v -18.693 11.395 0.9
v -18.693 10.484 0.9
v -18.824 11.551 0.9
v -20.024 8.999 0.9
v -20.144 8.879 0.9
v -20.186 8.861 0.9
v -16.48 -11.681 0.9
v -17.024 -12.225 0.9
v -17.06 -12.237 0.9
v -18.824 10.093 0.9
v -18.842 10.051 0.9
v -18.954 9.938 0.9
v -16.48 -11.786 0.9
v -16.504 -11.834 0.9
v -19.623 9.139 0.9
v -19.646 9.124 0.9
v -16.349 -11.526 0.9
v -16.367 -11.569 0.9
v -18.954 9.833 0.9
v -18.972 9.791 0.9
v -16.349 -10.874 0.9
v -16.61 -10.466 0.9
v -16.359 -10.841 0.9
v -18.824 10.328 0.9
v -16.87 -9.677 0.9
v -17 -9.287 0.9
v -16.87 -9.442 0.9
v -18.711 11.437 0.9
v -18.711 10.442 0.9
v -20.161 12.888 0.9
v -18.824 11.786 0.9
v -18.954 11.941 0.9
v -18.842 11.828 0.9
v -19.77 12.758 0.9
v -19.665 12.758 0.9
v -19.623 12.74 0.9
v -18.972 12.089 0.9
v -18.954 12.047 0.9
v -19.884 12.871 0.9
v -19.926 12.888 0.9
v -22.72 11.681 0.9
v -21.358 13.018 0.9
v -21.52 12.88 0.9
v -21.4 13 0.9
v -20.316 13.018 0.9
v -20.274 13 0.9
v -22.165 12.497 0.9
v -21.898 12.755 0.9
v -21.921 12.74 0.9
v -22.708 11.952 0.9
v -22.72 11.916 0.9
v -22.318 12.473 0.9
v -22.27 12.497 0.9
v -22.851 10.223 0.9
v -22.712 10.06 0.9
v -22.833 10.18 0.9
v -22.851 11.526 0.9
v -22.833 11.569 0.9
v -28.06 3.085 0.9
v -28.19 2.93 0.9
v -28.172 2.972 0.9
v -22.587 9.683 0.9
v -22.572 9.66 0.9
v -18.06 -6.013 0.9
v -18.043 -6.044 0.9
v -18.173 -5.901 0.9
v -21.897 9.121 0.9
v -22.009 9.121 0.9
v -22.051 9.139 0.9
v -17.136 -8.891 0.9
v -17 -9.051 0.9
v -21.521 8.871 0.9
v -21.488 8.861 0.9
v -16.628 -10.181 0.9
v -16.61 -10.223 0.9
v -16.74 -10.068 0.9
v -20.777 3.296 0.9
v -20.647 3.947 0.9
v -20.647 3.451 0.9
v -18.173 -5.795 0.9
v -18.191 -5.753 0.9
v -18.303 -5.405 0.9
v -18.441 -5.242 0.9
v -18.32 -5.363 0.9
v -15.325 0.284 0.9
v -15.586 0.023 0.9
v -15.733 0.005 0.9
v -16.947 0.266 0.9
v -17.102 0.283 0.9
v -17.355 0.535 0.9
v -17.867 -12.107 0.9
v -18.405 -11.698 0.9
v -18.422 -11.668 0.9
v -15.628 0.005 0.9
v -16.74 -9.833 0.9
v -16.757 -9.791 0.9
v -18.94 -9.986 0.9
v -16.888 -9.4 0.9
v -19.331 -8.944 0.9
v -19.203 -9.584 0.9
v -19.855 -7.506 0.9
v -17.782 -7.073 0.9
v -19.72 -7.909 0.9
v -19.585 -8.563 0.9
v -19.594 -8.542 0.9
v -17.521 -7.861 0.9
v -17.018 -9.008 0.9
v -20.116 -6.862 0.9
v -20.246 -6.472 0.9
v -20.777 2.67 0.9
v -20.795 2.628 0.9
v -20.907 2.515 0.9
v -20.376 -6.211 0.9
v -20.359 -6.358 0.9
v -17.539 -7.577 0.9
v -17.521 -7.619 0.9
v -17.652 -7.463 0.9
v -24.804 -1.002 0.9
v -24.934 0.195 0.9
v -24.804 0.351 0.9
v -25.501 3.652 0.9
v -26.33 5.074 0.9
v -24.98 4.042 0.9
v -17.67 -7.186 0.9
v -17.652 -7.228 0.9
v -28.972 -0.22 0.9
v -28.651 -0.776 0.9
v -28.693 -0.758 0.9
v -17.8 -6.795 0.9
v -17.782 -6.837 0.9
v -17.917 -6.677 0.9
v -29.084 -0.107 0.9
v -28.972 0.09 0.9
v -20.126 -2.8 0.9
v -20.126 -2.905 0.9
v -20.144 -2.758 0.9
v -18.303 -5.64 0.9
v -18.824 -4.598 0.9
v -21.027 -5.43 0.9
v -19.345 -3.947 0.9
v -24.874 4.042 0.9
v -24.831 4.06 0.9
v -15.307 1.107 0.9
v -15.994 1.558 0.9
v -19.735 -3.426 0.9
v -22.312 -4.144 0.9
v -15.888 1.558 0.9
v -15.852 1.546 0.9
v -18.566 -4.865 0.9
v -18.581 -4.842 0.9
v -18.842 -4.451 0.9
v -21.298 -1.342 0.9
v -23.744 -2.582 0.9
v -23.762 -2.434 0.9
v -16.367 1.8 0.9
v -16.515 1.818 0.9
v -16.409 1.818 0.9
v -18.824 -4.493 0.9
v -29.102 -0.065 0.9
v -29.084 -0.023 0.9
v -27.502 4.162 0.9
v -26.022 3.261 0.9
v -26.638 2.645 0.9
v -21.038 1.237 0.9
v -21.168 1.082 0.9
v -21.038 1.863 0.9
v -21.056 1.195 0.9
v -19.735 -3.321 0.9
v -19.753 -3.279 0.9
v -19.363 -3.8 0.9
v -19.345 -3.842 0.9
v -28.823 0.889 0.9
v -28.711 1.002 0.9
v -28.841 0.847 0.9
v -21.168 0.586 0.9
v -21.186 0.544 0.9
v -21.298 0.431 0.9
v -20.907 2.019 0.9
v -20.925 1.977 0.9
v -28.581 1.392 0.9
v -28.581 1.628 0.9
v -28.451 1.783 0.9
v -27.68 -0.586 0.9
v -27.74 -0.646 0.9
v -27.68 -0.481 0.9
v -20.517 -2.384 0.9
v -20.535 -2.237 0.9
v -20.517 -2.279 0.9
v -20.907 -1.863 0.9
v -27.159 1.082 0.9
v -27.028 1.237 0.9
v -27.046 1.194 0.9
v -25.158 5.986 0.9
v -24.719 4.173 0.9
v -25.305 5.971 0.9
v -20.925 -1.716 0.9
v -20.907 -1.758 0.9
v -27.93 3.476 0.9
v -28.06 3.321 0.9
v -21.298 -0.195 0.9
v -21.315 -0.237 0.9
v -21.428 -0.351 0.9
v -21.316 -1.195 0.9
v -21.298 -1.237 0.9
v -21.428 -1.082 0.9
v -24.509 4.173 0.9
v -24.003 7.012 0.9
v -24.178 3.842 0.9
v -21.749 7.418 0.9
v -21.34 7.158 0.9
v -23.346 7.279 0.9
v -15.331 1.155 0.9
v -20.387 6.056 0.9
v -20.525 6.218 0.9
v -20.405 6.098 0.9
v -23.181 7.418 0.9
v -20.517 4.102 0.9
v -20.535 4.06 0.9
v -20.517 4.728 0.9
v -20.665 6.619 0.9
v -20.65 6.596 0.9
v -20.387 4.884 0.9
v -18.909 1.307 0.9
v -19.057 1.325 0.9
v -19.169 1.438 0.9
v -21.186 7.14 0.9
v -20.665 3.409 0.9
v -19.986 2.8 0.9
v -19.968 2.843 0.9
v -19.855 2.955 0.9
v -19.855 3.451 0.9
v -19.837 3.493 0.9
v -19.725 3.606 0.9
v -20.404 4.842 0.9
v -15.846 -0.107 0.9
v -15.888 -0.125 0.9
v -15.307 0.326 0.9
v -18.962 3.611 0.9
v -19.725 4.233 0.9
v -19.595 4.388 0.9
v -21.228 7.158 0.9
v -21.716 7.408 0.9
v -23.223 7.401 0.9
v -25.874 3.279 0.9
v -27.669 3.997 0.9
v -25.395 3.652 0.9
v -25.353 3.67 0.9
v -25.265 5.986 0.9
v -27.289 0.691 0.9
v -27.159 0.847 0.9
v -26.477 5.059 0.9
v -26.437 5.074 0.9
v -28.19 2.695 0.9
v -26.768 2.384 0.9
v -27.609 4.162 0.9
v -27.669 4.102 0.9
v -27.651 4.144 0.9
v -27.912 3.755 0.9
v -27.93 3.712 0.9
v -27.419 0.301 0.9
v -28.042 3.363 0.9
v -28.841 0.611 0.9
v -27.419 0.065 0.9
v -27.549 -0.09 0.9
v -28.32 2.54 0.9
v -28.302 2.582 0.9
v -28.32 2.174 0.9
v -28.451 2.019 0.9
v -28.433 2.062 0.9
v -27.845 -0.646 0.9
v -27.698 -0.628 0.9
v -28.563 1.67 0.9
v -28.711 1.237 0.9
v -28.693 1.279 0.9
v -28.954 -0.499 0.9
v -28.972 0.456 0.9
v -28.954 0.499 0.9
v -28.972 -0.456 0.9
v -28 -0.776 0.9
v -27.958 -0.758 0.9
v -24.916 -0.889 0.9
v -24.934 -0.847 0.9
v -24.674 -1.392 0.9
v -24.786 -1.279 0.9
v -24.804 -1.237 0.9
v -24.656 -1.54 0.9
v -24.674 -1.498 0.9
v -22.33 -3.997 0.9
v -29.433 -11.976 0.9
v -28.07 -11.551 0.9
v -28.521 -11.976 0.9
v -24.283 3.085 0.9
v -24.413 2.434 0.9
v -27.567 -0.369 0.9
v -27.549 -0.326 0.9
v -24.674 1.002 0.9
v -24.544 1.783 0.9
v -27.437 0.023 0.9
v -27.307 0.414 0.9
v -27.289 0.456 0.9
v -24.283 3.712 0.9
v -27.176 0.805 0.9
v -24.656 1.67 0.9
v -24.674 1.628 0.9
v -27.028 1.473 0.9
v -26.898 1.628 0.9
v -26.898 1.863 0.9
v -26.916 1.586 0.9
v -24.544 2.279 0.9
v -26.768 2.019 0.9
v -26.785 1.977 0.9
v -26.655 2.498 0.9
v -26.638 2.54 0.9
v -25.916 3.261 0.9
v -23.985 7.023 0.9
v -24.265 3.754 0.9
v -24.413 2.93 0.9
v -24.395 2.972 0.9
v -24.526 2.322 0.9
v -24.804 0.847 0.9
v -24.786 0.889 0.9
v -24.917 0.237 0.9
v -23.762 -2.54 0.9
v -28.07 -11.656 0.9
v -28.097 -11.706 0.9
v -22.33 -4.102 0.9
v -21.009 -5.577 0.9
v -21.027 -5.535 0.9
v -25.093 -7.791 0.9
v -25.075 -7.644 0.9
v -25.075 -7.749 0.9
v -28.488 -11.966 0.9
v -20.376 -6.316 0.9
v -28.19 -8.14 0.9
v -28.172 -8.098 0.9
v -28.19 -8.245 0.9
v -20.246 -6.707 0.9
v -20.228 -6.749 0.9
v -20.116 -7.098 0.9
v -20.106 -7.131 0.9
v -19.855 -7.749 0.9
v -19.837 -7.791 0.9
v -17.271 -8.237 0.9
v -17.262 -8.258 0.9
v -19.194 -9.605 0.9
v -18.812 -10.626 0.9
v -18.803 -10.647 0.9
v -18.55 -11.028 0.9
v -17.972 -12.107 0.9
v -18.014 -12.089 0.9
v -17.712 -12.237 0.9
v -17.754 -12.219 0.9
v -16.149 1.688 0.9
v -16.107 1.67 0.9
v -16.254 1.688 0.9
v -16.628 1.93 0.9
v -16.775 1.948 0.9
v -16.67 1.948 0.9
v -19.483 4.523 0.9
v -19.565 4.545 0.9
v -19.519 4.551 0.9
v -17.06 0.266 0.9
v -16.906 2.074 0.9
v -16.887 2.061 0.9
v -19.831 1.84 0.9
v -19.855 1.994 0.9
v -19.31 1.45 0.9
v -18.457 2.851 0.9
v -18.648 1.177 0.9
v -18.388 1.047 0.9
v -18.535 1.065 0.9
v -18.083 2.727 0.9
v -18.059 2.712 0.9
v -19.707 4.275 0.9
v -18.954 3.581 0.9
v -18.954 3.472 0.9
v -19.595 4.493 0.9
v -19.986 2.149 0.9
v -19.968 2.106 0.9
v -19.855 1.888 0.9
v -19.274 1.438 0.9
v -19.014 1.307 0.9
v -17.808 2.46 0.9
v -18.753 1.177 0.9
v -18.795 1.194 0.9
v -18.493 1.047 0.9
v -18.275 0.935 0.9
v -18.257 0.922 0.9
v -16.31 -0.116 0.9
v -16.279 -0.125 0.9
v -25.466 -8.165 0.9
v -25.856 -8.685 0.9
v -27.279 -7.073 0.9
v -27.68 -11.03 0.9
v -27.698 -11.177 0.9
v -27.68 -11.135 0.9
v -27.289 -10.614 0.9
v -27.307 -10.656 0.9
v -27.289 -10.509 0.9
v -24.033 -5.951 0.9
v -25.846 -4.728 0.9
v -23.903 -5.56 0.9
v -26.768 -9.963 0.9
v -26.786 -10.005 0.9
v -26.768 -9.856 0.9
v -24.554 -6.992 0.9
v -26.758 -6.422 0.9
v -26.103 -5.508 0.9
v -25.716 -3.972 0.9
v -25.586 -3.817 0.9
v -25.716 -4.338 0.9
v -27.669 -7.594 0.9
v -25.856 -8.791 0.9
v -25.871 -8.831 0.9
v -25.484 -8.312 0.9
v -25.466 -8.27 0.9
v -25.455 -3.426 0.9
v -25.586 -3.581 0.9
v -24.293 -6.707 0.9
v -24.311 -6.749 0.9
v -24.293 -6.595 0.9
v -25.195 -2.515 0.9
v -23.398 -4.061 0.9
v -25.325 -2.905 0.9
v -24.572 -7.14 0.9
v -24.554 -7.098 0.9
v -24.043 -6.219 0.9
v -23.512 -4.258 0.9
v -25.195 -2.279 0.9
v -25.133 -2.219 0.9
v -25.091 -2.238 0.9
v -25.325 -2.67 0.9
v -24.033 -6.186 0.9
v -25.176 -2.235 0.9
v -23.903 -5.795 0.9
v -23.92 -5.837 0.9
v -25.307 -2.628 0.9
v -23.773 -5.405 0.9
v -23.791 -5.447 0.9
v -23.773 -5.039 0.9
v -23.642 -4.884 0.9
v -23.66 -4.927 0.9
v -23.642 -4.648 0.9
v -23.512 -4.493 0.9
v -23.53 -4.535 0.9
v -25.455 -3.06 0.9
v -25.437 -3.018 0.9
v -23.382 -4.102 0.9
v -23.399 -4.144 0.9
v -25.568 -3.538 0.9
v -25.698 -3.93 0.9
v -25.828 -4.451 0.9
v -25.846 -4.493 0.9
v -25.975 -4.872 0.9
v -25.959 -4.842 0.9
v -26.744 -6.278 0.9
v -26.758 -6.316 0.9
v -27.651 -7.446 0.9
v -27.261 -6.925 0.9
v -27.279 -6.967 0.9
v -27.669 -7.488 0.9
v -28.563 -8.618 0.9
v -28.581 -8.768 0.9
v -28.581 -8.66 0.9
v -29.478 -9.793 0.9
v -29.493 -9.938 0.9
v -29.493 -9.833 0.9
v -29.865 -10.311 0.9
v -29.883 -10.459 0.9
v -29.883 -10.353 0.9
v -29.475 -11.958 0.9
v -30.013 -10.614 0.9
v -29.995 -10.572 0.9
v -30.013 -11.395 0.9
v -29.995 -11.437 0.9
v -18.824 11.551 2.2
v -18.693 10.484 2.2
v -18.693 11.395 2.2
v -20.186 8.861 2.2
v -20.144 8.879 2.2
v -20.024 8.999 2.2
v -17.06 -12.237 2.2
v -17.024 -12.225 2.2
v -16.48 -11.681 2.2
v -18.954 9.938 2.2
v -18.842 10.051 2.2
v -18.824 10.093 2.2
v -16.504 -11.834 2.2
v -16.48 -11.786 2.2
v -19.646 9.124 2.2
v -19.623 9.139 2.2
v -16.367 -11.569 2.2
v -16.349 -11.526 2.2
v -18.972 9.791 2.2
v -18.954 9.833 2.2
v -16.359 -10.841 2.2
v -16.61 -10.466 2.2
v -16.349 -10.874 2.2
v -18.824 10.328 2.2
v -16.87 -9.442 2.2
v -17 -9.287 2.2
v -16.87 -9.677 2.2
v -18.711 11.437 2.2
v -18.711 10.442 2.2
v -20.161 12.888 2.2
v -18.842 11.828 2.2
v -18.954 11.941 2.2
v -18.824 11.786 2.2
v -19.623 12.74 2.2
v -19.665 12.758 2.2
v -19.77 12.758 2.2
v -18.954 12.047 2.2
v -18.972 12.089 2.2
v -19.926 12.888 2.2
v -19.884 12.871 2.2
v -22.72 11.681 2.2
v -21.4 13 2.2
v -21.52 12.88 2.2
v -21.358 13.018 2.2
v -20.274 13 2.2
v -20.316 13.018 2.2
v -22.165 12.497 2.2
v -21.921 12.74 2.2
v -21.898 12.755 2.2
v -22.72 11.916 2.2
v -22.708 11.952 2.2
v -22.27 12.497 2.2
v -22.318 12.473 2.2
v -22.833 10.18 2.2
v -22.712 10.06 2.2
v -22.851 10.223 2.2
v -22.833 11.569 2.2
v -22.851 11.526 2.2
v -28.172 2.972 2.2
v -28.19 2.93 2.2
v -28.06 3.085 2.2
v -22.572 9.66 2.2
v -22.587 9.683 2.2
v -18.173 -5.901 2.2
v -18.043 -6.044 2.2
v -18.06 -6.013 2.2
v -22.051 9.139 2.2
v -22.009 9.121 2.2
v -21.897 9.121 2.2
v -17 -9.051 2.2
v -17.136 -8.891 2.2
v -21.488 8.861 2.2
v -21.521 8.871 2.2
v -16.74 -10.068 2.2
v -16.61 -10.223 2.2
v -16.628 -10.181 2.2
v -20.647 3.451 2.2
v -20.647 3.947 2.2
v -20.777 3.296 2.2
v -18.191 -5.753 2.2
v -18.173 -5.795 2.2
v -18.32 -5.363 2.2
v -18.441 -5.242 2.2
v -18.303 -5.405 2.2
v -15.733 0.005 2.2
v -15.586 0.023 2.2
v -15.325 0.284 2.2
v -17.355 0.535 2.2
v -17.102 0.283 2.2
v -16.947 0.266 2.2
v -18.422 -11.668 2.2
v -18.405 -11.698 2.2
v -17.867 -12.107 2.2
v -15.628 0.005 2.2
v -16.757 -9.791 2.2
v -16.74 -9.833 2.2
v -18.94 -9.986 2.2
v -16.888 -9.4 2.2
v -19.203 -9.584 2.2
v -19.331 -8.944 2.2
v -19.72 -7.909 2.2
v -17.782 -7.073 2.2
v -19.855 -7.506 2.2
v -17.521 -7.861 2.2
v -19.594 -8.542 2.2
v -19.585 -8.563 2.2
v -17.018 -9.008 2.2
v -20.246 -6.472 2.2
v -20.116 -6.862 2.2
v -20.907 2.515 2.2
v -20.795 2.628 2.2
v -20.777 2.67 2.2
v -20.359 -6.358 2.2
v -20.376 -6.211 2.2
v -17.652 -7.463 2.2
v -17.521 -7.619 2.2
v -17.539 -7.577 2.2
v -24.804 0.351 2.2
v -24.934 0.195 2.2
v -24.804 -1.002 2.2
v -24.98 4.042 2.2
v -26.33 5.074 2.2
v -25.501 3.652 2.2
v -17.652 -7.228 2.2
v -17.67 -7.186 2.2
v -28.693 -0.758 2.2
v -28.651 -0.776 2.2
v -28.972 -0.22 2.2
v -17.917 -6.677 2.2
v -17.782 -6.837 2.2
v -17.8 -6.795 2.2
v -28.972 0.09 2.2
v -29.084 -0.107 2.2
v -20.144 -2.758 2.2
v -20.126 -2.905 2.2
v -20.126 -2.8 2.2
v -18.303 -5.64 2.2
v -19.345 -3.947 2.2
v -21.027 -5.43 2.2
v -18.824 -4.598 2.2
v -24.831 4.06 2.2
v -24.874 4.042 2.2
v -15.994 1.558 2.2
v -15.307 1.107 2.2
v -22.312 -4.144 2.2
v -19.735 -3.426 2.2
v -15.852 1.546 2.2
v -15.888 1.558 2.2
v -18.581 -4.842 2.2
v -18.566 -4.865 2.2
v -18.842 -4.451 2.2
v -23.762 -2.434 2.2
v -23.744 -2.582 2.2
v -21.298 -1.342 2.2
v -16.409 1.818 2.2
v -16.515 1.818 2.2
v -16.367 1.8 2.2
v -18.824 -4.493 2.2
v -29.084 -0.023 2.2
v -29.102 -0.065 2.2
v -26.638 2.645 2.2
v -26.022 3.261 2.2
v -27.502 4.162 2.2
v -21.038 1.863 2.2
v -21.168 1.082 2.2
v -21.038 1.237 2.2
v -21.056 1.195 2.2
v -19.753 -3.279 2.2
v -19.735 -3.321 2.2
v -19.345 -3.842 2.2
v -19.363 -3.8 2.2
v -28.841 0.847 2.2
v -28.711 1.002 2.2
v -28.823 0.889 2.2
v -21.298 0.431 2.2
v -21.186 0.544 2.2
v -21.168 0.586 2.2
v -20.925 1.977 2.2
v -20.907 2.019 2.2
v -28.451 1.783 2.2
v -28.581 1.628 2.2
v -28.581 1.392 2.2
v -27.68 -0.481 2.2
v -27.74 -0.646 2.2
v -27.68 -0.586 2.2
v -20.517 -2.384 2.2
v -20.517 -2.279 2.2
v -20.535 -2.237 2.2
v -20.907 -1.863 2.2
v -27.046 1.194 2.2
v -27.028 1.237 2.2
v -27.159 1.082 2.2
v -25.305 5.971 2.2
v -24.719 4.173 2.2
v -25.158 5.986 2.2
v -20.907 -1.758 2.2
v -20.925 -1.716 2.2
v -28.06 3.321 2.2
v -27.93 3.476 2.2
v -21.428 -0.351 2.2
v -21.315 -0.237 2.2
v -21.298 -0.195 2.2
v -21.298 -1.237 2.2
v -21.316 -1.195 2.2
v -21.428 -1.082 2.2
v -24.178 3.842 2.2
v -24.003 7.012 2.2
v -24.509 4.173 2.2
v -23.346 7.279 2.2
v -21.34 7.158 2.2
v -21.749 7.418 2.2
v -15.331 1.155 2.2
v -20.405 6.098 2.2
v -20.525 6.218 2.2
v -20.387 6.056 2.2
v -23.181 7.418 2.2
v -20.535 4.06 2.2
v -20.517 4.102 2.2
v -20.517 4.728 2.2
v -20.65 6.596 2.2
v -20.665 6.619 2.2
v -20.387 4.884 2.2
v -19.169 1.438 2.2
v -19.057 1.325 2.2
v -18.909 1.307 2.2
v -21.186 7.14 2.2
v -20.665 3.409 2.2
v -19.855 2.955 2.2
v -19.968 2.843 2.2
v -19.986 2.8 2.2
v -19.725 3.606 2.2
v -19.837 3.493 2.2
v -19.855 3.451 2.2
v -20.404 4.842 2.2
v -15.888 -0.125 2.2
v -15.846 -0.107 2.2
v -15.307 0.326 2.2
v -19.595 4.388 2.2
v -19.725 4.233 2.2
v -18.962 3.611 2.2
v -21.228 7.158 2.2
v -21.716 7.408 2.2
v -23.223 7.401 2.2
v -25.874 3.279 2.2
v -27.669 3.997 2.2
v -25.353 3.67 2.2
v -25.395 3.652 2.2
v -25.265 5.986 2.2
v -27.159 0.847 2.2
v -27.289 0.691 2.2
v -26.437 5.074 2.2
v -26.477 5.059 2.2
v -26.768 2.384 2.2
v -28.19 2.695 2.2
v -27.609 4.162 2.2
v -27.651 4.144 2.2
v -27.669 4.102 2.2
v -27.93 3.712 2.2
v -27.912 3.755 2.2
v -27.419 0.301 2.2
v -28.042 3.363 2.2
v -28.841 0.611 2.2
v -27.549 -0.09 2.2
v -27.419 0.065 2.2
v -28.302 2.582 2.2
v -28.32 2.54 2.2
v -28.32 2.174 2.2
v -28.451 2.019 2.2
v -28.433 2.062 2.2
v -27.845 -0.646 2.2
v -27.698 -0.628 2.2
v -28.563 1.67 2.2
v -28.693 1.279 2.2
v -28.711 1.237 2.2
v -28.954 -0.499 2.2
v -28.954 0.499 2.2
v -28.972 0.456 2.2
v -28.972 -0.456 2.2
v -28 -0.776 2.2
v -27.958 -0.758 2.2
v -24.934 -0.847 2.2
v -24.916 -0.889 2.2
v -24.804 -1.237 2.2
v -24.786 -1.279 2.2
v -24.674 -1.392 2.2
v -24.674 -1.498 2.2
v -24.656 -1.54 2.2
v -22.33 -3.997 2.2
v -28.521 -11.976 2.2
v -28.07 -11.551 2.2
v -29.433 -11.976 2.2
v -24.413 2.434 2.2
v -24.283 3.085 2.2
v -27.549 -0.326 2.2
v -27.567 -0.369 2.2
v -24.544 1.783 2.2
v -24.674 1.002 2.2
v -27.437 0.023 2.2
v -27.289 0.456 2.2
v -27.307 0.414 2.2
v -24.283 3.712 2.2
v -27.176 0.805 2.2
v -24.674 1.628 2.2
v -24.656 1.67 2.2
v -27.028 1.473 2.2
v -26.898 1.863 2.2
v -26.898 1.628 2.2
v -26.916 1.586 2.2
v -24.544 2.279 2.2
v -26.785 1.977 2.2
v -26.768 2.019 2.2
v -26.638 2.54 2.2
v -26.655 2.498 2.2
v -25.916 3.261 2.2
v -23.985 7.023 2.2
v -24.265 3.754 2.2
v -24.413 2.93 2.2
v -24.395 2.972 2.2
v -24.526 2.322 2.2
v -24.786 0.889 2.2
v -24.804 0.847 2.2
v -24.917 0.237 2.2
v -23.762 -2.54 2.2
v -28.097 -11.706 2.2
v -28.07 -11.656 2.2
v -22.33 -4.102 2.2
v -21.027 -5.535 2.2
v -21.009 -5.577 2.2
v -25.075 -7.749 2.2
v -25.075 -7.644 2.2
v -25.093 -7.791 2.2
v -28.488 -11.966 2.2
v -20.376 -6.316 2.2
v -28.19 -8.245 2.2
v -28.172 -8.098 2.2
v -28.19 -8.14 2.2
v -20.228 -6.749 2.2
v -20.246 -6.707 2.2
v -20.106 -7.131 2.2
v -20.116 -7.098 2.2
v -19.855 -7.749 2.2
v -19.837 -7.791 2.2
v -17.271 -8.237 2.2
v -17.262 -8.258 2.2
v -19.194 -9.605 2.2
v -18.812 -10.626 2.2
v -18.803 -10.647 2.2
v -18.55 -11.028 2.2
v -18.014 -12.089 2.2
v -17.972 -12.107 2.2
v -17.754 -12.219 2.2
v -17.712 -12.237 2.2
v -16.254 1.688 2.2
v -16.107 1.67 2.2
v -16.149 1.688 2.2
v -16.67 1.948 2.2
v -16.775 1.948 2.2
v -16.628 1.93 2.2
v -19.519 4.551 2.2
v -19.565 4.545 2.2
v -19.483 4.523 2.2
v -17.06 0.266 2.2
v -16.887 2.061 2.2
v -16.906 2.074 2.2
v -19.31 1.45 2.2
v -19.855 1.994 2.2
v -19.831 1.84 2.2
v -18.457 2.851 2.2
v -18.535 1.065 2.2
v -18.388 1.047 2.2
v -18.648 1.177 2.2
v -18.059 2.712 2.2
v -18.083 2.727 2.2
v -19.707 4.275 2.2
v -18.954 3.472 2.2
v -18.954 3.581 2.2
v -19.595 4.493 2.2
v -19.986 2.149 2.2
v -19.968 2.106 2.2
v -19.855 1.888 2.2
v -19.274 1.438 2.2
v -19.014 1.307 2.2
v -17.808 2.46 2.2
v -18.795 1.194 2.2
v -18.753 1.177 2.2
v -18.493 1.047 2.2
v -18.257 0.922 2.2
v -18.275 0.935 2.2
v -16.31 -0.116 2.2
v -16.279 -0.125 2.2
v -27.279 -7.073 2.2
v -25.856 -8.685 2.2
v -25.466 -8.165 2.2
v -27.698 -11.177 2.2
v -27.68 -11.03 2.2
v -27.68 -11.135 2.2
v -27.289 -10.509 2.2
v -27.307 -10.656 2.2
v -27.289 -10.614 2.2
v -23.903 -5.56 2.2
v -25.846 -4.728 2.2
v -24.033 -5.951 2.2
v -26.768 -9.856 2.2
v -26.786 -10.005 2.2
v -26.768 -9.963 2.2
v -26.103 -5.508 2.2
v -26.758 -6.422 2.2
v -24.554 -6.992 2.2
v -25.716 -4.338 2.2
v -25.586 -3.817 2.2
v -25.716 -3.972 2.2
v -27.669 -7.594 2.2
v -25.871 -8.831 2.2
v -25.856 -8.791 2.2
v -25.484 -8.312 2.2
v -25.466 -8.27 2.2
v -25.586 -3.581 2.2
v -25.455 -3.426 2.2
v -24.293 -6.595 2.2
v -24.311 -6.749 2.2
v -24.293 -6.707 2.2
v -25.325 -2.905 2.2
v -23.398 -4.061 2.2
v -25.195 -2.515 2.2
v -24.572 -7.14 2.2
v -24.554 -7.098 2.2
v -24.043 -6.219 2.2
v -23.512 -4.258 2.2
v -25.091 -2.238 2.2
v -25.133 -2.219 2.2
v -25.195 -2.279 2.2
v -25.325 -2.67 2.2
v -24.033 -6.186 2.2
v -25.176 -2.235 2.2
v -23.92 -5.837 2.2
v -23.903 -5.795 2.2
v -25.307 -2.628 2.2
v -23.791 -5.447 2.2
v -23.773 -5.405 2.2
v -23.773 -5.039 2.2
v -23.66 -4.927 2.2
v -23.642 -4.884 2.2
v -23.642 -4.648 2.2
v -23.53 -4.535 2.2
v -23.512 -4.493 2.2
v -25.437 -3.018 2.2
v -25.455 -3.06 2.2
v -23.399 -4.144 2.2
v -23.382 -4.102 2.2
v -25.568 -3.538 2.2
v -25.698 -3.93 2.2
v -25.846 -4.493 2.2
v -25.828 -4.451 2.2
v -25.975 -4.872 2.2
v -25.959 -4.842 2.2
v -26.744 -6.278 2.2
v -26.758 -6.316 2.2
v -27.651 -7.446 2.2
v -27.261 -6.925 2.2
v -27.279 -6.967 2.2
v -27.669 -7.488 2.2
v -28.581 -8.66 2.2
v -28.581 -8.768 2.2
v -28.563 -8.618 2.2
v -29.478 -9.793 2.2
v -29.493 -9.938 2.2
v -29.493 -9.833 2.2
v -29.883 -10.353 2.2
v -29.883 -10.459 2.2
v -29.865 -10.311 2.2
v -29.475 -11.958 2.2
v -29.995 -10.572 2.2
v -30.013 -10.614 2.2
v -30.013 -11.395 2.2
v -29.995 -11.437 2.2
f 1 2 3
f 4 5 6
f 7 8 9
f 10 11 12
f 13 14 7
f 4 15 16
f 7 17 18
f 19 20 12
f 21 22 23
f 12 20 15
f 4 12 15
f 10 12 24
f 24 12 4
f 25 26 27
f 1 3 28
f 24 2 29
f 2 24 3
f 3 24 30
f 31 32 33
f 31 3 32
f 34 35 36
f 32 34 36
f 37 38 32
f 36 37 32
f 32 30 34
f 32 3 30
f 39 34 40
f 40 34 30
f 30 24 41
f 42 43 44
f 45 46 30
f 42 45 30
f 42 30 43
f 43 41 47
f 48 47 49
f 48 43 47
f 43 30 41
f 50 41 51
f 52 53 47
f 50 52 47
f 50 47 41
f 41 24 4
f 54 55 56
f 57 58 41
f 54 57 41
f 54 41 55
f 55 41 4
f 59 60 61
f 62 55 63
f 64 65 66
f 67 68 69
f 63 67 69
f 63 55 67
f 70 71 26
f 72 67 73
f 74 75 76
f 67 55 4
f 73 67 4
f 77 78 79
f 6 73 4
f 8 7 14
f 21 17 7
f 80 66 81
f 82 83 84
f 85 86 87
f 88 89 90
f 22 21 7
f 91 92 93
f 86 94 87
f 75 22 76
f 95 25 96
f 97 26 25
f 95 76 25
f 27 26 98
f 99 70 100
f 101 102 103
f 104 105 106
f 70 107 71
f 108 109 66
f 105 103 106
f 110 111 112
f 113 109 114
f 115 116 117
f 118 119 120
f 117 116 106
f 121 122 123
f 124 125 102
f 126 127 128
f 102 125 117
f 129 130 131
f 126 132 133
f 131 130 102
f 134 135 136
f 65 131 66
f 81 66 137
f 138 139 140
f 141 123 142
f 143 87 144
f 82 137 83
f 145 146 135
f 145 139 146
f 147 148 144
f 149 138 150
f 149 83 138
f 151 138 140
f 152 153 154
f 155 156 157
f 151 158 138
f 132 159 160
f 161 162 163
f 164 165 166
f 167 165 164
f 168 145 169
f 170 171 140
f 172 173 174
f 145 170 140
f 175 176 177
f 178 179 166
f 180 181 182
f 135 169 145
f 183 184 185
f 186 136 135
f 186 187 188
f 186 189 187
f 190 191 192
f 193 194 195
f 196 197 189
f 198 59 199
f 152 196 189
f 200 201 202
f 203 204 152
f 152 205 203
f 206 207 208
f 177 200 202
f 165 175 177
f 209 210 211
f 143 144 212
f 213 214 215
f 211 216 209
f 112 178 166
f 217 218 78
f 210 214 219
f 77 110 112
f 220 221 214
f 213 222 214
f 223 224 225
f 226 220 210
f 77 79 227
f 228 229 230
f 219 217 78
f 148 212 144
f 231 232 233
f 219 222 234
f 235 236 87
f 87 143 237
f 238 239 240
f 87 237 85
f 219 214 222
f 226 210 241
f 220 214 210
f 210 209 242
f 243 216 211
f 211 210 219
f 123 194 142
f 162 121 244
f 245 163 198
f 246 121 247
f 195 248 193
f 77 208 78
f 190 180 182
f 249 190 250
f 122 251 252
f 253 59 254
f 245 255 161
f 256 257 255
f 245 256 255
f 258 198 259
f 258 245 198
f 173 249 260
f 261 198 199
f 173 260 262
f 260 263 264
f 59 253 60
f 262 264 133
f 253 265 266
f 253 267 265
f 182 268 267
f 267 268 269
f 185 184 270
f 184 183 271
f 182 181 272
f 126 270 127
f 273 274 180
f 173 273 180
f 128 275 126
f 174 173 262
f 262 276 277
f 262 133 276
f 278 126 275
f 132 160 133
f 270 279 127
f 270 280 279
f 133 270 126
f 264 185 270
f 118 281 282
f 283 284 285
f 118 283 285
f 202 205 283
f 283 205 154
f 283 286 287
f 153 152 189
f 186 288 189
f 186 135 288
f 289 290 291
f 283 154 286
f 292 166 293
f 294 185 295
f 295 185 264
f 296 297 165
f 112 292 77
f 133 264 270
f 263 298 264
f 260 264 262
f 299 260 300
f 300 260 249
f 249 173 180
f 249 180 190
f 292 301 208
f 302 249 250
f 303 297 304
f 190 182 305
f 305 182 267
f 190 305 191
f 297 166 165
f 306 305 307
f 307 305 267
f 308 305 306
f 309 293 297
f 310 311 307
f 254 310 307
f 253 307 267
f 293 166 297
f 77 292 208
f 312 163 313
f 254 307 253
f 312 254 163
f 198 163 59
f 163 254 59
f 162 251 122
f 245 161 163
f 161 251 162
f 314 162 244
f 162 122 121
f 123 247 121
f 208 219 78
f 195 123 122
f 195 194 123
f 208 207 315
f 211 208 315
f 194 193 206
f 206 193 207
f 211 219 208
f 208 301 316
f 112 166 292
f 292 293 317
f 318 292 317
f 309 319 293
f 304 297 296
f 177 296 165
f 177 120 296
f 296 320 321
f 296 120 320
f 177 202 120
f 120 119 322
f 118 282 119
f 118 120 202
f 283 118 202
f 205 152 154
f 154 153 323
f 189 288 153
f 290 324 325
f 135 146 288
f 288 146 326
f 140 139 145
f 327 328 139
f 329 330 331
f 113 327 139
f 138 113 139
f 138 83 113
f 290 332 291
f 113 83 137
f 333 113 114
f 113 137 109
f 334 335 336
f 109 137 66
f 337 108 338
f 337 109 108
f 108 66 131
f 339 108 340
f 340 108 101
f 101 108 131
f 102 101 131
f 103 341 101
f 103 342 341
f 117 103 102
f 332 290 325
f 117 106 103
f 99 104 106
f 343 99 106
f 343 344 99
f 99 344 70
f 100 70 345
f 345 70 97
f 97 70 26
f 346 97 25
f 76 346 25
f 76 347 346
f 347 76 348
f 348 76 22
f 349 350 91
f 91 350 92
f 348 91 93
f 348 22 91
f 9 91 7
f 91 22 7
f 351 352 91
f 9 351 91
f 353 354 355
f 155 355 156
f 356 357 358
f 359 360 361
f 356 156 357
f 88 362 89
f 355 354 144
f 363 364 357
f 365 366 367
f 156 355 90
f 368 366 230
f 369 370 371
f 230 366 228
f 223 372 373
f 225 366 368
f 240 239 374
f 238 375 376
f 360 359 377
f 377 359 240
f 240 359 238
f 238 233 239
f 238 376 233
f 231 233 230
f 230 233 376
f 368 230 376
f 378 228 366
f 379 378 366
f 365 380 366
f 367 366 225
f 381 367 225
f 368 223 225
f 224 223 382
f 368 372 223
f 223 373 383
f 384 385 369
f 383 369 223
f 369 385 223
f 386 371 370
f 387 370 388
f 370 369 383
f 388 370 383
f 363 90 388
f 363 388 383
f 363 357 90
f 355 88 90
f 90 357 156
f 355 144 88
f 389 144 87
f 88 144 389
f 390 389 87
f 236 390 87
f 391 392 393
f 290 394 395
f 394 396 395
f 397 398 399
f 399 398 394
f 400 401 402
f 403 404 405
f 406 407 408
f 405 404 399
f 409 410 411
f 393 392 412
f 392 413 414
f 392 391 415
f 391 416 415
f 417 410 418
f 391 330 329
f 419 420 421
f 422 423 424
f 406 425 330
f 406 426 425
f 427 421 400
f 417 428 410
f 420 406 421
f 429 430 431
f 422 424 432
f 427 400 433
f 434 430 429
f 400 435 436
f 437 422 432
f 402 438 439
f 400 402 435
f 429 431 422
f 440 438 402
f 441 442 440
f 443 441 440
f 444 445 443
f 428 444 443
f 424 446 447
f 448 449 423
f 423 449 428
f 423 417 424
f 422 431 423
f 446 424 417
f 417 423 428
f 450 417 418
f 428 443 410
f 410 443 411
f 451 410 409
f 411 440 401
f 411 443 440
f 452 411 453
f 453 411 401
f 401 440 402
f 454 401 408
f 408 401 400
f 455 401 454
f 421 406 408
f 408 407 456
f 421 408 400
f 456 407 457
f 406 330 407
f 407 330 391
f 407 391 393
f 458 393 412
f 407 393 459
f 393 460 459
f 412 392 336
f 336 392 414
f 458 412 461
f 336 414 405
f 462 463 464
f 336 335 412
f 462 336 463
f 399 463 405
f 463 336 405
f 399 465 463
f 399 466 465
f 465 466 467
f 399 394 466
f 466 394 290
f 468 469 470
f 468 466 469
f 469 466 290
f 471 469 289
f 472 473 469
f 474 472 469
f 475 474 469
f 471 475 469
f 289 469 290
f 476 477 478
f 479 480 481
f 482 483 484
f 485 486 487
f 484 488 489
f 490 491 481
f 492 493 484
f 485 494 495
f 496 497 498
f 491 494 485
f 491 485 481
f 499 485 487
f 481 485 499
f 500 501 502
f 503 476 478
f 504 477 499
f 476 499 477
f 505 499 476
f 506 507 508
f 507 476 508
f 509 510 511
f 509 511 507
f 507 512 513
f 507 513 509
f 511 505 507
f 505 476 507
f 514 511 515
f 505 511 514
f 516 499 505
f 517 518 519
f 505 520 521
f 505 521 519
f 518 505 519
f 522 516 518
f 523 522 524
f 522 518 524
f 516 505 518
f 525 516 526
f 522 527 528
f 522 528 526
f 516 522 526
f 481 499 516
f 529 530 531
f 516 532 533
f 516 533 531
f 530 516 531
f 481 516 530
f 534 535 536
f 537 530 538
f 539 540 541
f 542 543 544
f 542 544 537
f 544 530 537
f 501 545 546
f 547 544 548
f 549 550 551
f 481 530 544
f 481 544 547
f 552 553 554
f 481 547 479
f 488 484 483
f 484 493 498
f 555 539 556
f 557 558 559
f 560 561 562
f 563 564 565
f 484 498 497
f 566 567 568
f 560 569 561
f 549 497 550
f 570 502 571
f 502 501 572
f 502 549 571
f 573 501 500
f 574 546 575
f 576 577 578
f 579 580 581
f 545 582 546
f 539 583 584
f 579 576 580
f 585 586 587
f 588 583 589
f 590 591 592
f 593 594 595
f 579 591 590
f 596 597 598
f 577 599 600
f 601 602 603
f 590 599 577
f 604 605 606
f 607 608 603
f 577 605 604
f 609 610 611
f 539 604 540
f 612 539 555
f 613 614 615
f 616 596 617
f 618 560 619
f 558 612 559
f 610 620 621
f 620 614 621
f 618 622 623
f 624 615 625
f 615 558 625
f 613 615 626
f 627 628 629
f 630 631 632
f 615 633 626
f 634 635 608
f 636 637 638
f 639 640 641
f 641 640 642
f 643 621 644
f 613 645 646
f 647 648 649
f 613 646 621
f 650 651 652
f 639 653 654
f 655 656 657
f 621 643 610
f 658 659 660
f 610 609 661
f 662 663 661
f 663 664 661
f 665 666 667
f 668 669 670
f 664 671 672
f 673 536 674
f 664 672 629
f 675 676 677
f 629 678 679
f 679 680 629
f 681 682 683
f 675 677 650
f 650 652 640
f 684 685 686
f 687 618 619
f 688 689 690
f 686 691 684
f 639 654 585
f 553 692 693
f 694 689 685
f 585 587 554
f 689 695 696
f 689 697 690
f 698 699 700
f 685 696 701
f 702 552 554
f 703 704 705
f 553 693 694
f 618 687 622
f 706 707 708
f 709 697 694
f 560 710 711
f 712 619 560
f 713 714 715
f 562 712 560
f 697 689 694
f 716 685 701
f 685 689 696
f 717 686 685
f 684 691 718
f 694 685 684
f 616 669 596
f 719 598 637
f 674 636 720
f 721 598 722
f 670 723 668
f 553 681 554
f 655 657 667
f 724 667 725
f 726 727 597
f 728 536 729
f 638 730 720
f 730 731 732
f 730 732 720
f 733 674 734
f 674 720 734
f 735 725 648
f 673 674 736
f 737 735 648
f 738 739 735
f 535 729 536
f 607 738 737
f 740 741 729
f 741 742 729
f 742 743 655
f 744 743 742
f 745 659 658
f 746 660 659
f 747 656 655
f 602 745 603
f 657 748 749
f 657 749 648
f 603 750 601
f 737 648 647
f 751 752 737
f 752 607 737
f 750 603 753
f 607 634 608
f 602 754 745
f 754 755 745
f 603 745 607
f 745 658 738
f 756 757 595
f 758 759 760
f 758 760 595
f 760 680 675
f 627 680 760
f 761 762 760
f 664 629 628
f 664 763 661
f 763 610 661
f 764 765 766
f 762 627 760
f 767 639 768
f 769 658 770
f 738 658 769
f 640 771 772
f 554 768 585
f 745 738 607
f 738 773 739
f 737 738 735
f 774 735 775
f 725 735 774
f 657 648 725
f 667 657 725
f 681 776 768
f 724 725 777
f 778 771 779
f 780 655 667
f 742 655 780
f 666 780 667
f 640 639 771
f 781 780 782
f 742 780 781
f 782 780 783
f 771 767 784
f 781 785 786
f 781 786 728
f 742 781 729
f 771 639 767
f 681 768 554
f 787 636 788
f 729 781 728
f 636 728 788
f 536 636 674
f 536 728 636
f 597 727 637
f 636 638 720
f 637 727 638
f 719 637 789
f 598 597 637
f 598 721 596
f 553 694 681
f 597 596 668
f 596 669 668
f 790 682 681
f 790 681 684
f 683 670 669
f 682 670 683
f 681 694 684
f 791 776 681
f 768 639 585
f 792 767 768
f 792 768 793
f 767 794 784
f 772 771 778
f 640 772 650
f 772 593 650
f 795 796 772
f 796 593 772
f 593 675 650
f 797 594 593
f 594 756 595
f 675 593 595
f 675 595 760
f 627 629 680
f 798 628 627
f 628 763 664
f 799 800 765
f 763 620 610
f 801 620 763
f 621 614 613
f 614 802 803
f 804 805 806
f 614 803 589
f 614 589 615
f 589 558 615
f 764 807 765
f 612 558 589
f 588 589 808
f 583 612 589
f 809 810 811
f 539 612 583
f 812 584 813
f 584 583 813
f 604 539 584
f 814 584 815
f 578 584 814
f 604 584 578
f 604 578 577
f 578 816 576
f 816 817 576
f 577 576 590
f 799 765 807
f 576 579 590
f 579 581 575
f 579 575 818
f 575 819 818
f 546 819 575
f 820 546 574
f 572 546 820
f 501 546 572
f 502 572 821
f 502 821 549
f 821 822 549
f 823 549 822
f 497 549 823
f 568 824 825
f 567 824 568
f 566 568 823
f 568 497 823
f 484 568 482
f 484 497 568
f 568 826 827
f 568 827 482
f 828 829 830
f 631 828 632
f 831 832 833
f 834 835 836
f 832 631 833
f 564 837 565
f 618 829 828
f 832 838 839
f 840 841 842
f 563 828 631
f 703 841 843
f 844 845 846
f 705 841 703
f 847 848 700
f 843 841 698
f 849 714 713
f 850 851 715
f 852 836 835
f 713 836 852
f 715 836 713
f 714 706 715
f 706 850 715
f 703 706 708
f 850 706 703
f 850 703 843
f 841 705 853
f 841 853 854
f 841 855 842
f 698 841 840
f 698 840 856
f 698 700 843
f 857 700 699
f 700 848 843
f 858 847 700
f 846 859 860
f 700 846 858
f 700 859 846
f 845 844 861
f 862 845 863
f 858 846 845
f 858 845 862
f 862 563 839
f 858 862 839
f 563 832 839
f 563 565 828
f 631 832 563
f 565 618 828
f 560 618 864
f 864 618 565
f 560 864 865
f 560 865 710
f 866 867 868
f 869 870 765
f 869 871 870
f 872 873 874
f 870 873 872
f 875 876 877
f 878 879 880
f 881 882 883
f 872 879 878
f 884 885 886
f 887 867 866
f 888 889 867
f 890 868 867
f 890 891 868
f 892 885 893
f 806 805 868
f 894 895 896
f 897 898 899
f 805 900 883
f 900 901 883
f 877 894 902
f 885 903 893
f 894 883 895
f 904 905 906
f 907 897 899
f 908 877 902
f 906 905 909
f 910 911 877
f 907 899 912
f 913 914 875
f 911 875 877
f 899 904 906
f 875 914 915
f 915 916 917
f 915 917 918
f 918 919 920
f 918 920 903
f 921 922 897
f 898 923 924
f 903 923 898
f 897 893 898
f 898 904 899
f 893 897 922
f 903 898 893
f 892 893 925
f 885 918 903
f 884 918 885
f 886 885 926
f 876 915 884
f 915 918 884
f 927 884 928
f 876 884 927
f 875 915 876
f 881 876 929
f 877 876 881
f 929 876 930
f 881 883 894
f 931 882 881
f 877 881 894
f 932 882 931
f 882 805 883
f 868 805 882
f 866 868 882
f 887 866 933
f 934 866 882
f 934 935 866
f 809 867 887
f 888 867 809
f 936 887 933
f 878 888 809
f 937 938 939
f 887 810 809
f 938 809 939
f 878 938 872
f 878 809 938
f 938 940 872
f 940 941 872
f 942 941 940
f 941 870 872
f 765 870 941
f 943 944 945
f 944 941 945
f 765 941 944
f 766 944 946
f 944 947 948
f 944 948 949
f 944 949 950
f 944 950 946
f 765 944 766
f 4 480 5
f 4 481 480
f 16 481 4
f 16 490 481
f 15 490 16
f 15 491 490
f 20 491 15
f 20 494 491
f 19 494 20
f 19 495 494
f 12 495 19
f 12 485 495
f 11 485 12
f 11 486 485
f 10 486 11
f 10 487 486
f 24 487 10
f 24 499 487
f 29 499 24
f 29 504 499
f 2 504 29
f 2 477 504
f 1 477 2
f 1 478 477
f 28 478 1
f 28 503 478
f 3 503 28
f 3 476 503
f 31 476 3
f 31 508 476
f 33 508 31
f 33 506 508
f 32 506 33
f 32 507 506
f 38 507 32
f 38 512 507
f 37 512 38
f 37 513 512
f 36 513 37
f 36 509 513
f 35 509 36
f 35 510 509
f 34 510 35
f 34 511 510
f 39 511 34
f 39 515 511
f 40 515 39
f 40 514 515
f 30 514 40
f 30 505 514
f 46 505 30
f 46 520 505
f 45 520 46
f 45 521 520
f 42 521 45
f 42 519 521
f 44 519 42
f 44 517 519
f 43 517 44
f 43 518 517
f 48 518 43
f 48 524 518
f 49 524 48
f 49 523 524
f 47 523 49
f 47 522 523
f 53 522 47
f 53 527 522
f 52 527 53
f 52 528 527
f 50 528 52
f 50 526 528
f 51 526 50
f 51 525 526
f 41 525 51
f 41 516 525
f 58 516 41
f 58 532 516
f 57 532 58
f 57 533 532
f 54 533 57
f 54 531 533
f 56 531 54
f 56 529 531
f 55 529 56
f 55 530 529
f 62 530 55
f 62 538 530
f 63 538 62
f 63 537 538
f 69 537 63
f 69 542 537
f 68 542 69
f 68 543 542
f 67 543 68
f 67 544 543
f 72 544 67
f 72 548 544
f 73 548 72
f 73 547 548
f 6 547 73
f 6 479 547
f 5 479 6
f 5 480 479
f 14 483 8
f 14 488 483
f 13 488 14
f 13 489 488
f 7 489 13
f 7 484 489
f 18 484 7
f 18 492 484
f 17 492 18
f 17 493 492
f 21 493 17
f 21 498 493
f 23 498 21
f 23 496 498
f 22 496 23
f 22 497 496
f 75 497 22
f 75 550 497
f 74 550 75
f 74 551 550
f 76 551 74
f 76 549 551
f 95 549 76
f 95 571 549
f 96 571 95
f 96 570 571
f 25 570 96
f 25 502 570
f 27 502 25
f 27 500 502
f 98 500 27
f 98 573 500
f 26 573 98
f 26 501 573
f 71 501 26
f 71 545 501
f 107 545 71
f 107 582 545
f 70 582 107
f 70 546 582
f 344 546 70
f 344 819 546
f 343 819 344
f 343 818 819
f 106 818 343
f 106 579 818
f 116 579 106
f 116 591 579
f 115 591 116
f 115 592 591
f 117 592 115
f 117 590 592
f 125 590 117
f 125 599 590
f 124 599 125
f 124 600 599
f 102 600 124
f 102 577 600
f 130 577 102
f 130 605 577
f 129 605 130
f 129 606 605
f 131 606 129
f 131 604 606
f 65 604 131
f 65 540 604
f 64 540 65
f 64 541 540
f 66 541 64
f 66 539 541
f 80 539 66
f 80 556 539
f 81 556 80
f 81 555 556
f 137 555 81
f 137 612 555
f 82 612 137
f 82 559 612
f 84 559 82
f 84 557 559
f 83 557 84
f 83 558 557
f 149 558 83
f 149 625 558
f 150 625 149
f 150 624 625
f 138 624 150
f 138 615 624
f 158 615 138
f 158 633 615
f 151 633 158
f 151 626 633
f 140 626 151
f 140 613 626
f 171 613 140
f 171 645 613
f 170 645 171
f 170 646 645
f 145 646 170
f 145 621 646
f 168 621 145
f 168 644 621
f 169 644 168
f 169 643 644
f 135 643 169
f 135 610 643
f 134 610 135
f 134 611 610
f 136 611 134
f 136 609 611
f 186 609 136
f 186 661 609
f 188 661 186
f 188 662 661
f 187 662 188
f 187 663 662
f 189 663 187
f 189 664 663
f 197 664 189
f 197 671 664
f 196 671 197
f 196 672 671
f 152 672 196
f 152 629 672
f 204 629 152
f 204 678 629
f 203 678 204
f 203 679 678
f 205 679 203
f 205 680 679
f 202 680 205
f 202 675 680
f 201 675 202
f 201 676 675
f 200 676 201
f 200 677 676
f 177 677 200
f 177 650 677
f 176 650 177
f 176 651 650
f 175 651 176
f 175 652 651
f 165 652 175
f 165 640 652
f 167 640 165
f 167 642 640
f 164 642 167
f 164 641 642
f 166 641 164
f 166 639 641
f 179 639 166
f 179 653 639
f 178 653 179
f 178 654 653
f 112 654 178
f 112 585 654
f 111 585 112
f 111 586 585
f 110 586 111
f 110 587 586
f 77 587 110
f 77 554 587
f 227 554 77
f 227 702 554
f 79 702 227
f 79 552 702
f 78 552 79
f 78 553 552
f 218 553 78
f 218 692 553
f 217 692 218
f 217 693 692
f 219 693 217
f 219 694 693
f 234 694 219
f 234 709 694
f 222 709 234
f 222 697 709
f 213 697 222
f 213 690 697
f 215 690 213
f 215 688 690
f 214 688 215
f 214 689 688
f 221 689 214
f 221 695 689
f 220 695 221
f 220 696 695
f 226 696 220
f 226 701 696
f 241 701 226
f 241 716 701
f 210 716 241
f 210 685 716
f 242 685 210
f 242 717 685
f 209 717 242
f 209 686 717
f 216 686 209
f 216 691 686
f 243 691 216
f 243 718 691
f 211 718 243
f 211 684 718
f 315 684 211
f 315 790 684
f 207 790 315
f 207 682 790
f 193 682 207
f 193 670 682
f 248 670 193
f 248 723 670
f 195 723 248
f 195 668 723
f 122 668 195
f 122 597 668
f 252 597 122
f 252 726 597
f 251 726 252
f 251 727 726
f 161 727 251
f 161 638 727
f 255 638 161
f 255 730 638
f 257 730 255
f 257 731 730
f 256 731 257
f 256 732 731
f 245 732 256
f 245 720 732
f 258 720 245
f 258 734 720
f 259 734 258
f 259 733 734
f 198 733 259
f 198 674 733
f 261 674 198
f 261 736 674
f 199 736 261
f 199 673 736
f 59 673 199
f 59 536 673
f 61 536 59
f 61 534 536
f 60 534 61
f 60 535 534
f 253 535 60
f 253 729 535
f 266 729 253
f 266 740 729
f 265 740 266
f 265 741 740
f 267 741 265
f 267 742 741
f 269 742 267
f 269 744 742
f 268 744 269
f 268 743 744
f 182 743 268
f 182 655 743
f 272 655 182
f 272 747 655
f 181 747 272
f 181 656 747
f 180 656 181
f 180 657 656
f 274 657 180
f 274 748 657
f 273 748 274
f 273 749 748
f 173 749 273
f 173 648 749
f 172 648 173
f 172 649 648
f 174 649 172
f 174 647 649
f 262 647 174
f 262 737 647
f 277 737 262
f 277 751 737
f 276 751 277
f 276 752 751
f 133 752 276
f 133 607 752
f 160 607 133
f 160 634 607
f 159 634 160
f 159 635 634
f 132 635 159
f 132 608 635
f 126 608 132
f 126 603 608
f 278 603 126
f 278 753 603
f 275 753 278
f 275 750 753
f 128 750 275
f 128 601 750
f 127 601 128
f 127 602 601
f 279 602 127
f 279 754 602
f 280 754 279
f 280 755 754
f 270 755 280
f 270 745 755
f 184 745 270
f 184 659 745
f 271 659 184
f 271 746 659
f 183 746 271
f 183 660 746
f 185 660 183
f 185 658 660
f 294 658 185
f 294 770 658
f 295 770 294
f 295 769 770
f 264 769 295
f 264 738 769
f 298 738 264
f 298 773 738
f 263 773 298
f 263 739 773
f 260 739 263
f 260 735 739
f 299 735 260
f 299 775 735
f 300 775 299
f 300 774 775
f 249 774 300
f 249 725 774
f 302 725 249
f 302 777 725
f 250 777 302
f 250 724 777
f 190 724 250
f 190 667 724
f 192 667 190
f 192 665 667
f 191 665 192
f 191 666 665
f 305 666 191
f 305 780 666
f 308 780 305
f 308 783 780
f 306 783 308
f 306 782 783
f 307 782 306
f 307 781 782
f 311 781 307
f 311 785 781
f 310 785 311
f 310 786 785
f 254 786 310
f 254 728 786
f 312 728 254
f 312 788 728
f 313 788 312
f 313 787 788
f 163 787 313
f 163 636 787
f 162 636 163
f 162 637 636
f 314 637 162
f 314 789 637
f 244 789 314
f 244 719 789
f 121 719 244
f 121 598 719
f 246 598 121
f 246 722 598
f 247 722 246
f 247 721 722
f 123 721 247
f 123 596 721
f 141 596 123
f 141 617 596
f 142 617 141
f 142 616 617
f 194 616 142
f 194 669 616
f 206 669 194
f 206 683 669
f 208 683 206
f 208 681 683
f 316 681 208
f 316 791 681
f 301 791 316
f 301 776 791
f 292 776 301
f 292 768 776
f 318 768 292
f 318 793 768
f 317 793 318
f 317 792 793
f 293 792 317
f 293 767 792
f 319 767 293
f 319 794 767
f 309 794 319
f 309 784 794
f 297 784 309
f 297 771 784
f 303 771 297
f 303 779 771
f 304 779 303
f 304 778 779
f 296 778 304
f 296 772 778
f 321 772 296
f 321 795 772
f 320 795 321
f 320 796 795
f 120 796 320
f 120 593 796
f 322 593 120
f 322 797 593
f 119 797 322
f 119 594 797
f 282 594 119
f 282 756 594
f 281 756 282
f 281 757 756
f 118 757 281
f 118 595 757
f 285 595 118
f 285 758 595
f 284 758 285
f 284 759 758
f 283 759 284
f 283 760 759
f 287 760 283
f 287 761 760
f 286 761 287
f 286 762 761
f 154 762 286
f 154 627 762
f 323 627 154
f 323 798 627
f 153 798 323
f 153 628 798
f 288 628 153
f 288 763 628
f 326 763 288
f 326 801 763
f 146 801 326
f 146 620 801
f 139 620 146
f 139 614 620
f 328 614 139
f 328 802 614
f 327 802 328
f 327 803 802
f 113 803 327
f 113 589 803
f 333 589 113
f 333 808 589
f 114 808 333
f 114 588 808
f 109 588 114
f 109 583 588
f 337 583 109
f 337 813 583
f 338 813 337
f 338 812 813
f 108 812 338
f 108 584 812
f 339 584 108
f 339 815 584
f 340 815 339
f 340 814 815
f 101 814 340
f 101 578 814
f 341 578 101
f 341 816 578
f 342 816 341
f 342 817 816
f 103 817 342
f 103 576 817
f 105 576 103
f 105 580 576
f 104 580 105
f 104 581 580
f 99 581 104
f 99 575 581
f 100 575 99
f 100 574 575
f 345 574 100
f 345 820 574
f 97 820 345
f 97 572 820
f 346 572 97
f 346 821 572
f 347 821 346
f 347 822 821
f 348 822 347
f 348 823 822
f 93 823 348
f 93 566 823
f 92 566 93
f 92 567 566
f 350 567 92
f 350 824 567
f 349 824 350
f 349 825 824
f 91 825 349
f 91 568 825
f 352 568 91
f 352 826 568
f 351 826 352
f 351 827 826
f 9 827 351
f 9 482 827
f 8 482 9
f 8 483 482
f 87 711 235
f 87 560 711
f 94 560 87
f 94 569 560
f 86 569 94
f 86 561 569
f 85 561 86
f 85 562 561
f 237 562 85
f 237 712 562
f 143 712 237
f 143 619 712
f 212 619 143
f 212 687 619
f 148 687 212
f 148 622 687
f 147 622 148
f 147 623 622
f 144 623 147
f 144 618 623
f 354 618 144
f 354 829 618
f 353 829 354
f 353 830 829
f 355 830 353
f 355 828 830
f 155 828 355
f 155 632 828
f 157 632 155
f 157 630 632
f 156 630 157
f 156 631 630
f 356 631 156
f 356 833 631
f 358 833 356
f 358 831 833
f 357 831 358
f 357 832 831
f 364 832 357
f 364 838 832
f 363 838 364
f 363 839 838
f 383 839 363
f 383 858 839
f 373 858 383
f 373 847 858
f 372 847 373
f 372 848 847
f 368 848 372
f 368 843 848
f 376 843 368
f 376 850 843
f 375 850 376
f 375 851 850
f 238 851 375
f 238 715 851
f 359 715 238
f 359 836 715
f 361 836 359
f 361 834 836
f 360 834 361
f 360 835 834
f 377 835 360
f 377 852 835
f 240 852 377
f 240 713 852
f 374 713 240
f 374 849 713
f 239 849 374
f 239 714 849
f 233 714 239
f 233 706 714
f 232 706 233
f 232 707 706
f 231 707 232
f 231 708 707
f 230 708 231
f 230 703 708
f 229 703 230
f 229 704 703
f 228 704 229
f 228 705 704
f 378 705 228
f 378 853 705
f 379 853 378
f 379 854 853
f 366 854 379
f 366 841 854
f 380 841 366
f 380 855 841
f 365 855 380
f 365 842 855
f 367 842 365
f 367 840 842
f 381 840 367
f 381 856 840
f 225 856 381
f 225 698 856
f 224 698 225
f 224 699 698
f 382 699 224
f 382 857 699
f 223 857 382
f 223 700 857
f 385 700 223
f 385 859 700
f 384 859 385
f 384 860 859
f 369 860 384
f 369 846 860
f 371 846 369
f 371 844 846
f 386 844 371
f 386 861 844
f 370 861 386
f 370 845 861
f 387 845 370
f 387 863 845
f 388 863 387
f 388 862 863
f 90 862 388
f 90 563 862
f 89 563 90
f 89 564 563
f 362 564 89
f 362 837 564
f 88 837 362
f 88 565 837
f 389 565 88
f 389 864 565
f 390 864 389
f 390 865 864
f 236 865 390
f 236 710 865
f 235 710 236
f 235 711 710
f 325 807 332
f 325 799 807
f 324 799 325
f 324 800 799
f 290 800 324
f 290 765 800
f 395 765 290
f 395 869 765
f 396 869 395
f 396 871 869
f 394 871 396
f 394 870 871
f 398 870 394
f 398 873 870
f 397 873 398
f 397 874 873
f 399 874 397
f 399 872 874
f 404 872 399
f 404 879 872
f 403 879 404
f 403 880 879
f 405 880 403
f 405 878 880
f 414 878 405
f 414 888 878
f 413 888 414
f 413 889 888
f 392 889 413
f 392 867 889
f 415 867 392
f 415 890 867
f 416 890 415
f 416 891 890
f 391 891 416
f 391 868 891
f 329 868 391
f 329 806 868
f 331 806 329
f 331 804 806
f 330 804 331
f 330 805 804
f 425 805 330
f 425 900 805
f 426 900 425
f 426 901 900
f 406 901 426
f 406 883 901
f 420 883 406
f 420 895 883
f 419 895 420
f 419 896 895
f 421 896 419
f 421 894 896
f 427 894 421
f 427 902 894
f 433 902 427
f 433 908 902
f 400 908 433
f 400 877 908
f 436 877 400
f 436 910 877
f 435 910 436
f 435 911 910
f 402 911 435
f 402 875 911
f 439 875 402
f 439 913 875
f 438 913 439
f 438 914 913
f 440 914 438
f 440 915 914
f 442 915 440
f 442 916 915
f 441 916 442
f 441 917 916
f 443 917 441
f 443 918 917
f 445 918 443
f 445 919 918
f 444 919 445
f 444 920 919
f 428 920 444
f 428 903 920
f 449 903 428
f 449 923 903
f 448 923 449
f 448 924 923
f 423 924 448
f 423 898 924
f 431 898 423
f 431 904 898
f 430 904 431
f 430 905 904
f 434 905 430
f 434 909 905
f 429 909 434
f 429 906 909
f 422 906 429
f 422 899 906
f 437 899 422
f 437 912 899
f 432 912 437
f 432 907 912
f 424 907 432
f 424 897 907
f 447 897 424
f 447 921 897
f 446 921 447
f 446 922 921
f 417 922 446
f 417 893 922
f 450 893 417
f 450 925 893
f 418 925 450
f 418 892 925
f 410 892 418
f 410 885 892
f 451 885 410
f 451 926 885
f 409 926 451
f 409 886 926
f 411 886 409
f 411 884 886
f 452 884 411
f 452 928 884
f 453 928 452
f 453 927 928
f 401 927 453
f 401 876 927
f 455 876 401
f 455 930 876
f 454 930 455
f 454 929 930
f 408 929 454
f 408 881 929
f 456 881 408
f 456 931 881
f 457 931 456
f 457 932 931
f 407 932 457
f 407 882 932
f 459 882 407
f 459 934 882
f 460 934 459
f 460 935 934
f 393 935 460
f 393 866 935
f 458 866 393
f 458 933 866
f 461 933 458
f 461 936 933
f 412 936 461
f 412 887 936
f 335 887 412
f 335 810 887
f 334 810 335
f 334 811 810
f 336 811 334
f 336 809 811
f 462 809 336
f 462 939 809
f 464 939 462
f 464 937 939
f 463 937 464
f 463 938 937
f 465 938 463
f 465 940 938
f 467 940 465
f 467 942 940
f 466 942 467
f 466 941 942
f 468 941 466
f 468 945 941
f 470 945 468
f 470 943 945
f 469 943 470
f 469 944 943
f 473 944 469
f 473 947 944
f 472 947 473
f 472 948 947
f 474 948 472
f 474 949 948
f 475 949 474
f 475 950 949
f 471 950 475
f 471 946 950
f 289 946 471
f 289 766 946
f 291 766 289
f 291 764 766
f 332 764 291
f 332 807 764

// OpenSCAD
$fn = 24;
translate([0, 0.000, 0.900])
  linear_extrude(height=1.300) {
offset(r=0.06, $fn=8) {
    polygon(points=[[-25.135,-2.279],[-25.135,-2.540],[-25.265,-2.670],[-25.265,-2.930],[-25.395,-3.060],[-25.395,-3.451],[-25.526,-3.581],[-25.526,-3.842],[-25.656,-3.972],[-25.656,-4.363],[-25.786,-4.493],[-25.786,-4.753],[-25.916,-4.884],[-26.047,-5.535],[-26.698,-6.316],[-26.698,-6.447],[-27.219,-6.967],[-27.219,-7.098],[-27.609,-7.488],[-27.609,-7.619],[-28.130,-8.140],[-28.130,-8.270],[-28.521,-8.660],[-28.521,-8.791],[-29.433,-9.833],[-29.433,-9.963],[-29.823,-10.353],[-29.823,-10.484],[-29.953,-10.614],[-29.953,-11.395],[-29.433,-11.916],[-28.521,-11.916],[-28.130,-11.656],[-28.130,-11.526],[-27.740,-11.135],[-27.740,-11.005],[-27.349,-10.614],[-27.349,-10.484],[-26.828,-9.963],[-26.828,-9.833],[-25.916,-8.791],[-25.916,-8.660],[-25.526,-8.270],[-25.526,-8.140],[-25.135,-7.749],[-25.135,-7.619],[-24.614,-7.098],[-24.614,-6.967],[-24.353,-6.707],[-24.353,-6.577],[-24.093,-6.186],[-24.093,-5.926],[-23.963,-5.795],[-23.963,-5.535],[-23.833,-5.405],[-23.833,-5.014],[-23.702,-4.884],[-23.702,-4.623],[-23.572,-4.493],[-23.572,-4.233],[-23.442,-4.102]], paths=[[0,1,2,3,4,5,6,7,8,9,10,11,12,13,14,15,16,17,18,19,20,21,22,23,24,25,26,27,28,29,30,31,32,33,34,35,36,37,38,39,40,41,42,43,44,45,46,47,48,49,50,51,52,53,54,55,56,57,58,59,60]]);
    polygon(points=[[-19.535,4.493],[-19.535,4.363],[-19.665,4.233],[-19.665,3.581],[-19.795,3.451],[-19.795,2.930],[-19.926,2.800],[-19.926,2.149],[-19.795,2.019],[-19.795,1.888],[-19.274,1.498],[-19.144,1.498],[-19.014,1.367],[-18.884,1.367],[-18.753,1.237],[-18.623,1.237],[-18.493,1.107],[-18.363,1.107],[-18.233,0.977],[-17.321,0.586],[-17.060,0.326],[-16.930,0.326],[-16.279,-0.065],[-15.888,-0.065],[-15.758,0.065],[-15.628,0.065],[-15.367,0.326],[-15.367,1.107],[-15.888,1.498],[-16.019,1.498],[-16.149,1.628],[-16.279,1.628],[-16.409,1.758],[-16.540,1.758],[-16.670,1.888],[-16.800,1.888],[-16.930,2.019],[-17.842,2.409],[-18.102,2.670],[-18.493,2.800],[-19.014,3.451],[-19.014,3.581]], paths=[[0,1,2,3,4,5,6,7,8,9,10,11,12,13,14,15,16,17,18,19,20,21,22,23,24,25,26,27,28,29,30,31,32,33,34,35,36,37,38,39,40,41]]);
    polygon(points=[[-23.181,7.358],[-23.312,7.228],[-23.963,6.967],[-25.135,5.926],[-25.265,5.926],[-26.307,5.014],[-26.437,5.014],[-27.479,4.102],[-27.609,4.102],[-27.609,3.972],[-27.870,3.712],[-27.870,3.451],[-28.000,3.321],[-28.000,3.060],[-28.130,2.930],[-28.130,2.670],[-28.260,2.540],[-28.260,2.149],[-28.391,2.019],[-28.391,1.758],[-28.521,1.628],[-28.521,1.367],[-28.651,1.237],[-28.651,0.977],[-28.781,0.847],[-28.781,0.586],[-28.912,0.456],[-28.912,0.065],[-29.042,-0.065],[-28.912,-0.195],[-28.912,-0.456],[-28.651,-0.716],[-28.000,-0.716],[-27.870,-0.586],[-27.740,-0.586],[-27.740,-0.456],[-27.609,-0.326],[-27.609,-0.065],[-27.479,0.065],[-27.479,0.326],[-27.349,0.456],[-27.349,0.716],[-27.219,0.847],[-27.219,1.107],[-27.088,1.237],[-27.088,1.498],[-26.958,1.628],[-26.958,1.888],[-26.828,2.019],[-26.828,2.409],[-26.698,2.540],[-26.698,2.670],[-26.047,3.321],[-25.916,3.321],[-25.526,3.712],[-25.395,3.712],[-25.005,4.102],[-24.874,4.102],[-24.744,4.233],[-24.484,4.233],[-24.093,3.842],[-24.223,3.712],[-24.223,3.060],[-24.353,2.930],[-24.353,2.409],[-24.484,2.279],[-24.484,1.758],[-24.614,1.628],[-24.614,0.977],[-24.744,0.847],[-24.744,0.326],[-24.874,0.195],[-24.874,-0.847],[-24.744,-0.977],[-24.744,-1.237],[-24.614,-1.367],[-24.614,-1.498],[-23.702,-2.409],[-23.702,-2.540],[-22.270,-3.972],[-22.270,-4.102],[-20.967,-5.405],[-20.967,-5.535],[-20.316,-6.186],[-20.316,-6.316],[-20.186,-6.447],[-20.186,-6.707],[-20.056,-6.837],[-20.056,-7.098],[-19.795,-7.488],[-19.795,-7.749],[-19.665,-7.879],[-19.535,-8.530],[-19.274,-8.921],[-19.144,-9.572],[-18.884,-9.963],[-18.753,-10.614],[-18.493,-11.005],[-18.363,-11.656],[-17.972,-12.047],[-17.842,-12.047],[-17.712,-12.177],[-17.060,-12.177],[-16.540,-11.786],[-16.540,-11.656],[-16.409,-11.526],[-16.409,-10.874],[-16.670,-10.484],[-16.670,-10.223],[-16.800,-10.093],[-16.800,-9.833],[-16.930,-9.702],[-16.930,-9.442],[-17.060,-9.312],[-17.060,-9.051],[-17.191,-8.921],[-17.321,-8.270],[-17.581,-7.879],[-17.581,-7.619],[-17.712,-7.488],[-17.712,-7.228],[-17.842,-7.098],[-17.842,-6.837],[-17.972,-6.707],[-18.102,-6.056],[-18.233,-5.926],[-18.233,-5.795],[-18.363,-5.665],[-18.363,-5.405],[-18.493,-5.274],[-18.623,-4.884],[-18.884,-4.623],[-18.884,-4.493],[-19.405,-3.972],[-19.405,-3.842],[-19.795,-3.451],[-19.795,-3.321],[-20.186,-2.930],[-20.186,-2.800],[-20.577,-2.409],[-20.577,-2.279],[-20.967,-1.888],[-20.967,-1.758],[-21.358,-1.367],[-21.358,-1.237],[-21.488,-1.107],[-21.488,-0.326],[-21.358,-0.195],[-21.358,0.456],[-21.228,0.586],[-21.228,1.107],[-21.098,1.237],[-21.098,1.888],[-20.967,2.019],[-20.967,2.540],[-20.837,2.670],[-20.837,3.321],[-20.707,3.451],[-20.707,3.972],[-20.577,4.102],[-20.577,4.753],[-20.447,4.884],[-20.447,6.056],[-20.577,6.186],[-20.707,6.577],[-21.228,7.098],[-21.358,7.098],[-21.749,7.358]], paths=[[0,1,2,3,4,5,6,7,8,9,10,11,12,13,14,15,16,17,18,19,20,21,22,23,24,25,26,27,28,29,30,31,32,33,34,35,36,37,38,39,40,41,42,43,44,45,46,47,48,49,50,51,52,53,54,55,56,57,58,59,60,61,62,63,64,65,66,67,68,69,70,71,72,73,74,75,76,77,78,79,80,81,82,83,84,85,86,87,88,89,90,91,92,93,94,95,96,97,98,99,100,101,102,103,104,105,106,107,108,109,110,111,112,113,114,115,116,117,118,119,120,121,122,123,124,125,126,127,128,129,130,131,132,133,134,135,136,137,138,139,140,141,142,143,144,145,146,147,148,149,150,151,152,153,154,155,156,157,158,159,160,161,162,163,164,165,166,167]]);
    polygon(points=[[-21.358,12.958],[-21.488,12.828],[-21.879,12.698],[-22.140,12.437],[-22.270,12.437],[-22.660,11.916],[-22.660,11.656],[-22.791,11.526],[-22.791,10.223],[-22.660,10.093],[-22.530,9.702],[-22.009,9.181],[-21.879,9.181],[-21.488,8.921],[-20.186,8.921],[-20.056,9.051],[-19.665,9.181],[-19.014,9.833],[-19.014,9.963],[-18.884,10.093],[-18.884,10.353],[-18.753,10.484],[-18.753,11.395],[-18.884,11.526],[-18.884,11.786],[-19.014,11.916],[-19.014,12.047],[-19.665,12.698],[-19.795,12.698],[-19.926,12.828],[-20.186,12.828],[-20.316,12.958]], paths=[[0,1,2,3,4,5,6,7,8,9,10,11,12,13,14,15,16,17,18,19,20,21,22,23,24,25,26,27,28,29,30,31]]);
}
}
